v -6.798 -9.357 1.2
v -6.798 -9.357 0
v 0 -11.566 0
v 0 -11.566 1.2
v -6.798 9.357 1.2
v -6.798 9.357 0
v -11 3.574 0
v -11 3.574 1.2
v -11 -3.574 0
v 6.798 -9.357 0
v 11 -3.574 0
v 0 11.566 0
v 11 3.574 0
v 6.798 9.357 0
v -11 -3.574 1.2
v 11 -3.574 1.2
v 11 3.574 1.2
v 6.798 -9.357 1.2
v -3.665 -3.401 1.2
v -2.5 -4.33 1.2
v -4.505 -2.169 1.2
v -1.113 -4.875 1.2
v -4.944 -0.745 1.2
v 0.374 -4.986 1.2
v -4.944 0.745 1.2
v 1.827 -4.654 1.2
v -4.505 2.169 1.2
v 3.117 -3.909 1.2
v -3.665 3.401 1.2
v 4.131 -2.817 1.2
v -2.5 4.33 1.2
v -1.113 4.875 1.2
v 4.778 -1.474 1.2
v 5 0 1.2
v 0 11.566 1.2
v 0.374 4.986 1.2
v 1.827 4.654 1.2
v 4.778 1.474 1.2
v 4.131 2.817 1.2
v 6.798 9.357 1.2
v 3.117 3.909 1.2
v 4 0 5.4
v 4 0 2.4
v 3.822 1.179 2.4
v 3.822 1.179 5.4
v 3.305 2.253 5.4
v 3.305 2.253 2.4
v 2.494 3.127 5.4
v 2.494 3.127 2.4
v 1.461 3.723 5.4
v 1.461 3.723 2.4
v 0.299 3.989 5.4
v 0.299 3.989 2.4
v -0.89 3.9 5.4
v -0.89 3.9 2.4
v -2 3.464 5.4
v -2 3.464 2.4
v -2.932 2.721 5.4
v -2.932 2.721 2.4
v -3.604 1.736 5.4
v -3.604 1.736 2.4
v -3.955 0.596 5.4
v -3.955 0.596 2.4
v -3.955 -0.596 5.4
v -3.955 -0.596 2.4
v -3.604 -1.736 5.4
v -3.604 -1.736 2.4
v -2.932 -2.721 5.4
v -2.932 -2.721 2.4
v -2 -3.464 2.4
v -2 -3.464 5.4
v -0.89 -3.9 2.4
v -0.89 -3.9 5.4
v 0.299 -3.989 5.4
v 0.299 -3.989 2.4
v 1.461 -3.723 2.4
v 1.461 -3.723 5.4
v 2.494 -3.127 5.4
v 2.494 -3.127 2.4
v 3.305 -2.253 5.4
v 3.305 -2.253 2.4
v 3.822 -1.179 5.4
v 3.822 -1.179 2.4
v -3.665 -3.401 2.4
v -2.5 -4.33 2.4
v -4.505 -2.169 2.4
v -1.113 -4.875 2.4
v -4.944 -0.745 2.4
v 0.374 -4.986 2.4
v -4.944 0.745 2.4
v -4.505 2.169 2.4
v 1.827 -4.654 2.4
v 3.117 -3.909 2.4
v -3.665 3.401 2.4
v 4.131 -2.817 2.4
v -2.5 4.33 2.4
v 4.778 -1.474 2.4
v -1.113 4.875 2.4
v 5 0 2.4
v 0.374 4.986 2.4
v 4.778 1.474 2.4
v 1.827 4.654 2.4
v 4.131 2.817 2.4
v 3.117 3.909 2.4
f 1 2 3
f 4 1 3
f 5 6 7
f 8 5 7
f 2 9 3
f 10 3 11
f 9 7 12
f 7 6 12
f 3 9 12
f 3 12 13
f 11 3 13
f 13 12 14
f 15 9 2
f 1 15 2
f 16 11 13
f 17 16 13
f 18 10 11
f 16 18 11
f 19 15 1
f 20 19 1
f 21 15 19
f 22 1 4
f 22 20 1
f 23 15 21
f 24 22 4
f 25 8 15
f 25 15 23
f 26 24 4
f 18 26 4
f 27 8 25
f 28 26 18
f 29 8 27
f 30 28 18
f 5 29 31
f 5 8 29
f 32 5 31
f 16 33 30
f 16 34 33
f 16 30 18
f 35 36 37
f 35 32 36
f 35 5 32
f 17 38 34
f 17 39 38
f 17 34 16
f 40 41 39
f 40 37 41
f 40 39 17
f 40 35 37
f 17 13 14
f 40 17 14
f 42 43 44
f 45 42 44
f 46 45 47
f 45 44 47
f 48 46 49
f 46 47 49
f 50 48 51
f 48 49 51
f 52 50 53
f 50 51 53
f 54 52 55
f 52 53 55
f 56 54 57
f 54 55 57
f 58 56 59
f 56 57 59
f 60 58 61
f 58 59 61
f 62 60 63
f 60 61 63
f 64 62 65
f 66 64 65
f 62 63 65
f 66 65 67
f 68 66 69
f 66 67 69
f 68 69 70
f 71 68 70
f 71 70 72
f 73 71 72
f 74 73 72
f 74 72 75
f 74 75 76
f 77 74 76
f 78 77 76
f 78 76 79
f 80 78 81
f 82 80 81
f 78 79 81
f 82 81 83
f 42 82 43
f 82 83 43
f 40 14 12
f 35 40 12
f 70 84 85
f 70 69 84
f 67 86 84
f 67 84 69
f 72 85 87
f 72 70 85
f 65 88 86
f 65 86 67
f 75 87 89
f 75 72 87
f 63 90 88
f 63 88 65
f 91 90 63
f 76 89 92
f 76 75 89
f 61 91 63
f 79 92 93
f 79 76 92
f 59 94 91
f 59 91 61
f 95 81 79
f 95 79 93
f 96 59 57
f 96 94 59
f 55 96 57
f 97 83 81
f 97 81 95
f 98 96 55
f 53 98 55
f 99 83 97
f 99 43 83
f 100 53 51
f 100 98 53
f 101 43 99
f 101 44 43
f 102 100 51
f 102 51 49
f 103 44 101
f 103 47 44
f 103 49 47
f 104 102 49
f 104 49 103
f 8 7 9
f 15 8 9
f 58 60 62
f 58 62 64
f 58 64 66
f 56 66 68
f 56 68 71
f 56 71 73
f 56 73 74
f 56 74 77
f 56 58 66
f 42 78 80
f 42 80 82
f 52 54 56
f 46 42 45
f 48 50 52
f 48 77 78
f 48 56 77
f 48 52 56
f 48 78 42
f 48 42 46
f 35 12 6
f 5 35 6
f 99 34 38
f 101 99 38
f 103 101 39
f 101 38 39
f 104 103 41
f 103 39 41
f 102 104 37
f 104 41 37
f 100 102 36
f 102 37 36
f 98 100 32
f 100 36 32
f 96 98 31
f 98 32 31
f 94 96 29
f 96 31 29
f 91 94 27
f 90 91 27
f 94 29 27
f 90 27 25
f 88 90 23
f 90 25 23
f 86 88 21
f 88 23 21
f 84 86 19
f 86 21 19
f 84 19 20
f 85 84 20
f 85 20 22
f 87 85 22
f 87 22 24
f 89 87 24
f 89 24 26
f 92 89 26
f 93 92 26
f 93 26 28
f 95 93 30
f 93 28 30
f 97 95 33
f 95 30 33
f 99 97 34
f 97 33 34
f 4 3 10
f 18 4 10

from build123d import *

# Parameters (mm, degrees)
F1_DEPTH = 1.2
F2_R     = 5
F3_DEPTH = 1.2
F4_R     = 4
F5_DEPTH = 3


with BuildPart() as f1:
    # F0 (on Top) → F1 (new body)
    with BuildSketch(Plane.XY):
        Polygon((-11, 3.574117), (-11, -3.574117), (-6.798374, -9.357159), (0, -11.566084), (6.798374, -9.357159), (11, -3.574117), (11, 3.574117), (6.798374, 9.357159), (0, 11.566084), (-6.798374, 9.357159), align=None)
    extrude(amount=F1_DEPTH)

    # F2 (on face) → F3 (join)
    with BuildSketch(Plane.XY.offset(1.2)):
        Circle(F2_R)
    extrude(amount=F3_DEPTH)

    # F4 (on face) → F5 (join)
    with BuildSketch(Plane.XY.offset(2.4)):
        Circle(F4_R)
    extrude(amount=F5_DEPTH)


solid = f1.part
